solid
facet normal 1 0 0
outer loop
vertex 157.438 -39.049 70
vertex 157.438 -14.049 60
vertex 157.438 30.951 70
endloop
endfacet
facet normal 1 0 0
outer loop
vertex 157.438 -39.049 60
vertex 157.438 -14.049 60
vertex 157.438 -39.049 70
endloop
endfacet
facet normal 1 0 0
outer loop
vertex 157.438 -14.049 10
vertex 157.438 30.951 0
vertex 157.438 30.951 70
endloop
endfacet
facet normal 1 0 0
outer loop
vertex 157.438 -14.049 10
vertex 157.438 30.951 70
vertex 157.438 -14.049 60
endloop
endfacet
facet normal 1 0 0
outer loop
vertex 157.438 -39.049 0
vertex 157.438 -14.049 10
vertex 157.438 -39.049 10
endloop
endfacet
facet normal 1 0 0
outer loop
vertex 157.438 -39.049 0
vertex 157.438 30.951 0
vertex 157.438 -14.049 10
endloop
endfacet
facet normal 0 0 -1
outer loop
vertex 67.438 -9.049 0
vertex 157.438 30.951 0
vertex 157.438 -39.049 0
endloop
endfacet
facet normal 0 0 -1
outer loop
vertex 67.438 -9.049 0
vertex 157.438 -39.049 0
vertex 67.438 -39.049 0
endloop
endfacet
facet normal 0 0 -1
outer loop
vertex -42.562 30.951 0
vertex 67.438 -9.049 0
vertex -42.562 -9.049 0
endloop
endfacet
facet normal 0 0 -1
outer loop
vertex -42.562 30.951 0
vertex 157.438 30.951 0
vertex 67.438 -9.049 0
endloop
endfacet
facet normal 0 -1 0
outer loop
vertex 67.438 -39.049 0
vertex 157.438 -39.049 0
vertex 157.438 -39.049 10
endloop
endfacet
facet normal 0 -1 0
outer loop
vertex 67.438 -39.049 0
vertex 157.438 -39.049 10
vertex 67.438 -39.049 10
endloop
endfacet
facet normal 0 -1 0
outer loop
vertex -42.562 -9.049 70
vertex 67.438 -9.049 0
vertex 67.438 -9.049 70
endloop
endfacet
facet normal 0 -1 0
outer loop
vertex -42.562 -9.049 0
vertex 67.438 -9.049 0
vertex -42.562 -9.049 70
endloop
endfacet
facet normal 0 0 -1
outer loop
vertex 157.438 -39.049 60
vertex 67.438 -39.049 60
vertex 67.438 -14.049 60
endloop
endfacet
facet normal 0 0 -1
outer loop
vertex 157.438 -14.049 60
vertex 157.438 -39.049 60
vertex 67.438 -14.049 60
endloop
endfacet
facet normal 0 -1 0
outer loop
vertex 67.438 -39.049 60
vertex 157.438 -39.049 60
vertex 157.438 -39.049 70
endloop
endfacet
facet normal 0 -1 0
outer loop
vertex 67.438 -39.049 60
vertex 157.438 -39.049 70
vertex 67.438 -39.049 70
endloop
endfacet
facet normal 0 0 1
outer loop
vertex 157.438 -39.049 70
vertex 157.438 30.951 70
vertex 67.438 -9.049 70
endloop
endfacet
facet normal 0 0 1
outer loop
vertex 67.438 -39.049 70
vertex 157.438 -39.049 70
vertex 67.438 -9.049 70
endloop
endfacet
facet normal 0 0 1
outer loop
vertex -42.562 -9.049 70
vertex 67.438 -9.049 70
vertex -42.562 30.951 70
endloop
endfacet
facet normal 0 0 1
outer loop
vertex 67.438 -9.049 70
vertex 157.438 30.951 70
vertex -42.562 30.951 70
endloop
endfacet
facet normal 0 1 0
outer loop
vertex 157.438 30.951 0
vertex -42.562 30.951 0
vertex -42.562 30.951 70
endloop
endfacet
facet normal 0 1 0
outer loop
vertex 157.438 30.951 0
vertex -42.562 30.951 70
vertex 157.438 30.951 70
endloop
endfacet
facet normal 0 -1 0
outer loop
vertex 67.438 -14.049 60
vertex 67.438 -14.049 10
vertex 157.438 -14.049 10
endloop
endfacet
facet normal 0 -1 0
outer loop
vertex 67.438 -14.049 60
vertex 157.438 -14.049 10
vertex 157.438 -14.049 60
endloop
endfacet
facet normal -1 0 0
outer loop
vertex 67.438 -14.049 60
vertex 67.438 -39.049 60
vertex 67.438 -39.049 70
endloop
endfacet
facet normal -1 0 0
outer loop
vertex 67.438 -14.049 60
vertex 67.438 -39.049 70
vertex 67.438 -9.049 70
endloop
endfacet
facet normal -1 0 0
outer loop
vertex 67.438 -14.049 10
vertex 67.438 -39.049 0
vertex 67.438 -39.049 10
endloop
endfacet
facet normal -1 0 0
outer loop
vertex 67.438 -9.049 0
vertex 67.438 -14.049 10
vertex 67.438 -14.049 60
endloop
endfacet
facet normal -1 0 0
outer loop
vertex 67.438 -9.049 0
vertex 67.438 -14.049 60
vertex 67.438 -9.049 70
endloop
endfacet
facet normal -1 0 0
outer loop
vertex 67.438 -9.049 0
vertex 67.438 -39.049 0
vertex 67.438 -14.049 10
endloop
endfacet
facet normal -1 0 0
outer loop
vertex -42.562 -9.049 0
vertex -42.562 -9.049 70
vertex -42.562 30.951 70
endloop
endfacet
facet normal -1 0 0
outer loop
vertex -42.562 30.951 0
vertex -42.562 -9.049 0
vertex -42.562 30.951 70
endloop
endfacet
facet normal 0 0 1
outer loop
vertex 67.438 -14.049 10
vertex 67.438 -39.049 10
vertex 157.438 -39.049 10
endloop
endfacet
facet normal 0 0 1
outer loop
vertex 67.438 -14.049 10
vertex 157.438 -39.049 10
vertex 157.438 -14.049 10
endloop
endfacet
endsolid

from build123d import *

# Parameters (mm, degrees)
EXTRUDE_2_DEPTH     = 70
SKETCH_3_W          = 50
SKETCH_3_H          = 25
CUT_EXTRUDE_3_DEPTH = 91


with BuildPart() as part:
    # 草图1 → 凸台-拉伸2 (new body)
    with BuildSketch(Plane.XY):
        Polygon((-42.561983471, 30.9508549), (157.438016529, 30.9508549), (157.438016529, -39.0491451), (67.438016529, -39.0491451), (67.438016529, -9.0491451), (-42.561983471, -9.0491451), align=None)
    extrude(amount=EXTRUDE_2_DEPTH)

    # 草图3 → 切除-拉伸3 (cut, through all)
    with BuildSketch(Plane.ZY.offset(-67.438016529)):
        with Locations((35, -26.5491451)):
            Rectangle(SKETCH_3_W, SKETCH_3_H)
    extrude(amount=-CUT_EXTRUDE_3_DEPTH, mode=Mode.SUBTRACT)


solid = part.part
